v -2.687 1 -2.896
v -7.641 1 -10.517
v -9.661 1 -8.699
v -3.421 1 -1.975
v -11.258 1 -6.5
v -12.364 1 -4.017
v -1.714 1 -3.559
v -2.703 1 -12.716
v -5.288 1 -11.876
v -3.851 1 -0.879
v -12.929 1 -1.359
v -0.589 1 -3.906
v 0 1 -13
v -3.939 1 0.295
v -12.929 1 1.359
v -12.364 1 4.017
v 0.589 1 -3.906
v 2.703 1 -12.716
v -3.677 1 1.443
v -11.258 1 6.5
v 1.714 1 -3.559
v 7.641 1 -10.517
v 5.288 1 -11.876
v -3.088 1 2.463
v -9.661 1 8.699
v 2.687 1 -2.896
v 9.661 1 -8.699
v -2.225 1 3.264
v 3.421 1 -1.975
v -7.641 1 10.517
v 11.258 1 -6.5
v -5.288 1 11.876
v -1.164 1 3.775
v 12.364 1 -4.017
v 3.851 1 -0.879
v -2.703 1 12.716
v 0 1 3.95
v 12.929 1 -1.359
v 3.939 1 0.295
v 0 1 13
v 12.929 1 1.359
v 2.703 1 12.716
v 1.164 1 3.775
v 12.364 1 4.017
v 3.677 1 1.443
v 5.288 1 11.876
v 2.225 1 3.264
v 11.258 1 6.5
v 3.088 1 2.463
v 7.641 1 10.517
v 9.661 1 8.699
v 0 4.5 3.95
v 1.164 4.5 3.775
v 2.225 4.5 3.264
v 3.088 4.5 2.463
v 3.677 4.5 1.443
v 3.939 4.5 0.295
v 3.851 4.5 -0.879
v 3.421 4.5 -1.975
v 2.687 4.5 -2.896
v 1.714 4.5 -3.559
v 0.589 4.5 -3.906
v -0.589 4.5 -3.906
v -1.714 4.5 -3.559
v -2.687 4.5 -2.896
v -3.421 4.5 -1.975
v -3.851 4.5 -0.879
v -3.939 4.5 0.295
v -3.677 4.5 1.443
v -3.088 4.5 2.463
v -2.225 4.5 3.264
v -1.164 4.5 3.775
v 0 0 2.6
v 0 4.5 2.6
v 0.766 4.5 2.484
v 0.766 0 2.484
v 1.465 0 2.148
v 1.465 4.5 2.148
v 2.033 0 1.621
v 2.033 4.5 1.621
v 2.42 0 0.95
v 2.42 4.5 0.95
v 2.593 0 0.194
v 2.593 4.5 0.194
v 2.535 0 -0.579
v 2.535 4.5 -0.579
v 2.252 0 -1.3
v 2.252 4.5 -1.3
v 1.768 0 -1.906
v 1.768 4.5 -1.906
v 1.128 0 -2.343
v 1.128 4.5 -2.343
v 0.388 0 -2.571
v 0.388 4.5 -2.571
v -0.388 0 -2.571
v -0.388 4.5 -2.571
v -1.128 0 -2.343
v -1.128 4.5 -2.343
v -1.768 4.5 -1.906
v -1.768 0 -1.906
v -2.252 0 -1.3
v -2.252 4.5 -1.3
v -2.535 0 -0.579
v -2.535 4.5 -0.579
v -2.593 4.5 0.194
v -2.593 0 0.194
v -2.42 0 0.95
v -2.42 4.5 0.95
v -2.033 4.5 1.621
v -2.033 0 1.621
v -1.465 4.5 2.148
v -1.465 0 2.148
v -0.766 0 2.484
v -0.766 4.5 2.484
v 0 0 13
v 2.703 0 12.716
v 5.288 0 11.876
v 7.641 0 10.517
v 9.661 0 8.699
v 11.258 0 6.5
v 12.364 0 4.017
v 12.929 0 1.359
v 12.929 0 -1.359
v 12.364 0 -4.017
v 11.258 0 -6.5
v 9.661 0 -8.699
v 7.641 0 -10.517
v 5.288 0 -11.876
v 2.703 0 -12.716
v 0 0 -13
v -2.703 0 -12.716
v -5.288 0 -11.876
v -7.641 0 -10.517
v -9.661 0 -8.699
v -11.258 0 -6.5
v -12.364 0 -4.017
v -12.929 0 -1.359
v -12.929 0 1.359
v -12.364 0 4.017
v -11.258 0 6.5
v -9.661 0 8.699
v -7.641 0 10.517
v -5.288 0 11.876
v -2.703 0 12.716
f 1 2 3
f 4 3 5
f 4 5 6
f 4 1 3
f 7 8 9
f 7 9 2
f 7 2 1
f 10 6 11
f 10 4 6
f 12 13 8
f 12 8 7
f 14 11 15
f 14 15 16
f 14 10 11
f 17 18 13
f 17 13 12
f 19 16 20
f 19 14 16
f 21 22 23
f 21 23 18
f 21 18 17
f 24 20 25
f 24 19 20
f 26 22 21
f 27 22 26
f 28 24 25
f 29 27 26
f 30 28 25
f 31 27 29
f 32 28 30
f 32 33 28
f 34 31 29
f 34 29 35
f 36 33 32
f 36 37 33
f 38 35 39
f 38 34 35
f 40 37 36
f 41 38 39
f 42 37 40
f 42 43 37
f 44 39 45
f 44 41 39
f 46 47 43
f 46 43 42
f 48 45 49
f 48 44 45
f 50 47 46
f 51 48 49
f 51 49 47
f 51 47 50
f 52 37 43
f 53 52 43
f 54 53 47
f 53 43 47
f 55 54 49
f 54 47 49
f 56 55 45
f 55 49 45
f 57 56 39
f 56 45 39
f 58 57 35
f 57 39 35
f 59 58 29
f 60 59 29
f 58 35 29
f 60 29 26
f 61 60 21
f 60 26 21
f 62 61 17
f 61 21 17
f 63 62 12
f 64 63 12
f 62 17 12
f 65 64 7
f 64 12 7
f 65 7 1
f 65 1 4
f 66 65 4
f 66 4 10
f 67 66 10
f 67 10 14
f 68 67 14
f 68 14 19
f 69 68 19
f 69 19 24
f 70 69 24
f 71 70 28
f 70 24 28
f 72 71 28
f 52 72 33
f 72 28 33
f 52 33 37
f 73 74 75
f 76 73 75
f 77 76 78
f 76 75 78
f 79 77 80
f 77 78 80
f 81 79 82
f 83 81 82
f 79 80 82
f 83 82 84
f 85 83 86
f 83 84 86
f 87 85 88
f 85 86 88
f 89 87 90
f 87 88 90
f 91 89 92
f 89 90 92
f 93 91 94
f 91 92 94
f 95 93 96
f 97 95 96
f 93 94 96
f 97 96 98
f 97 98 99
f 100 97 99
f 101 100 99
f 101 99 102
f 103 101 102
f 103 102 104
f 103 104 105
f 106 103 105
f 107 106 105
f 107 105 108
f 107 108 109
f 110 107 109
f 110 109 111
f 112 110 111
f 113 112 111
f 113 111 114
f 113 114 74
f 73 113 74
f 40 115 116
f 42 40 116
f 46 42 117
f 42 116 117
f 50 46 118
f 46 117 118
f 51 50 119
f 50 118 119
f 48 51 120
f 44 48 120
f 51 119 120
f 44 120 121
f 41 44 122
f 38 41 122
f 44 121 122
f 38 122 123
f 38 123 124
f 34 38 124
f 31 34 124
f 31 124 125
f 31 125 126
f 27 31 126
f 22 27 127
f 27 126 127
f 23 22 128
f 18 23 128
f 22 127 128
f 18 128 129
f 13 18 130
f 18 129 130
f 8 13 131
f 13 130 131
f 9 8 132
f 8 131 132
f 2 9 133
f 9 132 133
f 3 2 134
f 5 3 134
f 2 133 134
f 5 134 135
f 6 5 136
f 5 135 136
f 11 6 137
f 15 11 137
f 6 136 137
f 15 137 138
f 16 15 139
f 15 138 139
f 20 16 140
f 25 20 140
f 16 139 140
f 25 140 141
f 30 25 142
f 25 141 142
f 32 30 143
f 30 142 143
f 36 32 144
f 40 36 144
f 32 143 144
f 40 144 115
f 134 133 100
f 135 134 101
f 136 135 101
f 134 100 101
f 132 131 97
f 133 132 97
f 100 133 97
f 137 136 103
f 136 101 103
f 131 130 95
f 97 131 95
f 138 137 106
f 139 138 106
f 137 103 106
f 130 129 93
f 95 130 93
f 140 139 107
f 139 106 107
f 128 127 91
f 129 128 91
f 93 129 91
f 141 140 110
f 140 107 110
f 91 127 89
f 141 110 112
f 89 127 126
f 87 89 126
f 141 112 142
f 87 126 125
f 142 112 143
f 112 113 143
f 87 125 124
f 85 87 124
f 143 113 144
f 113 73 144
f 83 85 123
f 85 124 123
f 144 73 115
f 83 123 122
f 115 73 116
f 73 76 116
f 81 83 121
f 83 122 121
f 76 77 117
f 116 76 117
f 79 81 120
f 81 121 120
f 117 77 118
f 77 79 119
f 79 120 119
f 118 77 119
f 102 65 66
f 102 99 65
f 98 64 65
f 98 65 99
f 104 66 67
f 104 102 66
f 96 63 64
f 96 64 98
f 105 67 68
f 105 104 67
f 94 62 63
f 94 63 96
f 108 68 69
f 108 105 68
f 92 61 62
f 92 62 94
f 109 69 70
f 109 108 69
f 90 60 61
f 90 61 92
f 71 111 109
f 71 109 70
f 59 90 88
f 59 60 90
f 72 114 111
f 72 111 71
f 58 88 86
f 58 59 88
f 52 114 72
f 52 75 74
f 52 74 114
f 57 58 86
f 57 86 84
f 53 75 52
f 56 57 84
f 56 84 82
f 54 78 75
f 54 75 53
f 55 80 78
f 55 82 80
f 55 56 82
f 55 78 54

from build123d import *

# Parameters (mm, degrees)
CROQUIS1_R              = 13
SALIENTE_EXTRUIR1_DEPTH = 1
CROQUIS2_R              = 3.95
SALIENTE_EXTRUIR2_DEPTH = 3.5
CROQUIS3_R              = 2.6
CORTAR_EXTRUIR1_DEPTH   = 19.927493231


with BuildPart() as part:
    # Croquis1 → Saliente-Extruir1 (new body)
    with BuildSketch(Plane(origin=(0, 0, 0), x_dir=(1, 0, 0), z_dir=(0, 1, 0))):
        with Locations(Location((0, 0, 0), (0, 0, 270))):
            Circle(CROQUIS1_R)
    extrude(amount=SALIENTE_EXTRUIR1_DEPTH)

    # Croquis2 → Saliente-Extruir2 (add)
    with BuildSketch(Plane(origin=(0, 1, 0), x_dir=(1, 0, 0), z_dir=(0, 1, 0))):
        with Locations(Location((0, 0, 0), (0, 0, 270))):
            Circle(CROQUIS2_R)
    extrude(amount=SALIENTE_EXTRUIR2_DEPTH)

    # Croquis3 → Cortar-Extruir1 (cut, through all)
    with BuildSketch(Plane(origin=(0, 4.5, 0), x_dir=(1, 0, 0), z_dir=(0, 1, 0))):
        with Locations(Location((0, 0, 0), (0, 0, 270))):
            Circle(CROQUIS3_R)
    extrude(amount=-CORTAR_EXTRUIR1_DEPTH, mode=Mode.SUBTRACT)


solid = part.part
